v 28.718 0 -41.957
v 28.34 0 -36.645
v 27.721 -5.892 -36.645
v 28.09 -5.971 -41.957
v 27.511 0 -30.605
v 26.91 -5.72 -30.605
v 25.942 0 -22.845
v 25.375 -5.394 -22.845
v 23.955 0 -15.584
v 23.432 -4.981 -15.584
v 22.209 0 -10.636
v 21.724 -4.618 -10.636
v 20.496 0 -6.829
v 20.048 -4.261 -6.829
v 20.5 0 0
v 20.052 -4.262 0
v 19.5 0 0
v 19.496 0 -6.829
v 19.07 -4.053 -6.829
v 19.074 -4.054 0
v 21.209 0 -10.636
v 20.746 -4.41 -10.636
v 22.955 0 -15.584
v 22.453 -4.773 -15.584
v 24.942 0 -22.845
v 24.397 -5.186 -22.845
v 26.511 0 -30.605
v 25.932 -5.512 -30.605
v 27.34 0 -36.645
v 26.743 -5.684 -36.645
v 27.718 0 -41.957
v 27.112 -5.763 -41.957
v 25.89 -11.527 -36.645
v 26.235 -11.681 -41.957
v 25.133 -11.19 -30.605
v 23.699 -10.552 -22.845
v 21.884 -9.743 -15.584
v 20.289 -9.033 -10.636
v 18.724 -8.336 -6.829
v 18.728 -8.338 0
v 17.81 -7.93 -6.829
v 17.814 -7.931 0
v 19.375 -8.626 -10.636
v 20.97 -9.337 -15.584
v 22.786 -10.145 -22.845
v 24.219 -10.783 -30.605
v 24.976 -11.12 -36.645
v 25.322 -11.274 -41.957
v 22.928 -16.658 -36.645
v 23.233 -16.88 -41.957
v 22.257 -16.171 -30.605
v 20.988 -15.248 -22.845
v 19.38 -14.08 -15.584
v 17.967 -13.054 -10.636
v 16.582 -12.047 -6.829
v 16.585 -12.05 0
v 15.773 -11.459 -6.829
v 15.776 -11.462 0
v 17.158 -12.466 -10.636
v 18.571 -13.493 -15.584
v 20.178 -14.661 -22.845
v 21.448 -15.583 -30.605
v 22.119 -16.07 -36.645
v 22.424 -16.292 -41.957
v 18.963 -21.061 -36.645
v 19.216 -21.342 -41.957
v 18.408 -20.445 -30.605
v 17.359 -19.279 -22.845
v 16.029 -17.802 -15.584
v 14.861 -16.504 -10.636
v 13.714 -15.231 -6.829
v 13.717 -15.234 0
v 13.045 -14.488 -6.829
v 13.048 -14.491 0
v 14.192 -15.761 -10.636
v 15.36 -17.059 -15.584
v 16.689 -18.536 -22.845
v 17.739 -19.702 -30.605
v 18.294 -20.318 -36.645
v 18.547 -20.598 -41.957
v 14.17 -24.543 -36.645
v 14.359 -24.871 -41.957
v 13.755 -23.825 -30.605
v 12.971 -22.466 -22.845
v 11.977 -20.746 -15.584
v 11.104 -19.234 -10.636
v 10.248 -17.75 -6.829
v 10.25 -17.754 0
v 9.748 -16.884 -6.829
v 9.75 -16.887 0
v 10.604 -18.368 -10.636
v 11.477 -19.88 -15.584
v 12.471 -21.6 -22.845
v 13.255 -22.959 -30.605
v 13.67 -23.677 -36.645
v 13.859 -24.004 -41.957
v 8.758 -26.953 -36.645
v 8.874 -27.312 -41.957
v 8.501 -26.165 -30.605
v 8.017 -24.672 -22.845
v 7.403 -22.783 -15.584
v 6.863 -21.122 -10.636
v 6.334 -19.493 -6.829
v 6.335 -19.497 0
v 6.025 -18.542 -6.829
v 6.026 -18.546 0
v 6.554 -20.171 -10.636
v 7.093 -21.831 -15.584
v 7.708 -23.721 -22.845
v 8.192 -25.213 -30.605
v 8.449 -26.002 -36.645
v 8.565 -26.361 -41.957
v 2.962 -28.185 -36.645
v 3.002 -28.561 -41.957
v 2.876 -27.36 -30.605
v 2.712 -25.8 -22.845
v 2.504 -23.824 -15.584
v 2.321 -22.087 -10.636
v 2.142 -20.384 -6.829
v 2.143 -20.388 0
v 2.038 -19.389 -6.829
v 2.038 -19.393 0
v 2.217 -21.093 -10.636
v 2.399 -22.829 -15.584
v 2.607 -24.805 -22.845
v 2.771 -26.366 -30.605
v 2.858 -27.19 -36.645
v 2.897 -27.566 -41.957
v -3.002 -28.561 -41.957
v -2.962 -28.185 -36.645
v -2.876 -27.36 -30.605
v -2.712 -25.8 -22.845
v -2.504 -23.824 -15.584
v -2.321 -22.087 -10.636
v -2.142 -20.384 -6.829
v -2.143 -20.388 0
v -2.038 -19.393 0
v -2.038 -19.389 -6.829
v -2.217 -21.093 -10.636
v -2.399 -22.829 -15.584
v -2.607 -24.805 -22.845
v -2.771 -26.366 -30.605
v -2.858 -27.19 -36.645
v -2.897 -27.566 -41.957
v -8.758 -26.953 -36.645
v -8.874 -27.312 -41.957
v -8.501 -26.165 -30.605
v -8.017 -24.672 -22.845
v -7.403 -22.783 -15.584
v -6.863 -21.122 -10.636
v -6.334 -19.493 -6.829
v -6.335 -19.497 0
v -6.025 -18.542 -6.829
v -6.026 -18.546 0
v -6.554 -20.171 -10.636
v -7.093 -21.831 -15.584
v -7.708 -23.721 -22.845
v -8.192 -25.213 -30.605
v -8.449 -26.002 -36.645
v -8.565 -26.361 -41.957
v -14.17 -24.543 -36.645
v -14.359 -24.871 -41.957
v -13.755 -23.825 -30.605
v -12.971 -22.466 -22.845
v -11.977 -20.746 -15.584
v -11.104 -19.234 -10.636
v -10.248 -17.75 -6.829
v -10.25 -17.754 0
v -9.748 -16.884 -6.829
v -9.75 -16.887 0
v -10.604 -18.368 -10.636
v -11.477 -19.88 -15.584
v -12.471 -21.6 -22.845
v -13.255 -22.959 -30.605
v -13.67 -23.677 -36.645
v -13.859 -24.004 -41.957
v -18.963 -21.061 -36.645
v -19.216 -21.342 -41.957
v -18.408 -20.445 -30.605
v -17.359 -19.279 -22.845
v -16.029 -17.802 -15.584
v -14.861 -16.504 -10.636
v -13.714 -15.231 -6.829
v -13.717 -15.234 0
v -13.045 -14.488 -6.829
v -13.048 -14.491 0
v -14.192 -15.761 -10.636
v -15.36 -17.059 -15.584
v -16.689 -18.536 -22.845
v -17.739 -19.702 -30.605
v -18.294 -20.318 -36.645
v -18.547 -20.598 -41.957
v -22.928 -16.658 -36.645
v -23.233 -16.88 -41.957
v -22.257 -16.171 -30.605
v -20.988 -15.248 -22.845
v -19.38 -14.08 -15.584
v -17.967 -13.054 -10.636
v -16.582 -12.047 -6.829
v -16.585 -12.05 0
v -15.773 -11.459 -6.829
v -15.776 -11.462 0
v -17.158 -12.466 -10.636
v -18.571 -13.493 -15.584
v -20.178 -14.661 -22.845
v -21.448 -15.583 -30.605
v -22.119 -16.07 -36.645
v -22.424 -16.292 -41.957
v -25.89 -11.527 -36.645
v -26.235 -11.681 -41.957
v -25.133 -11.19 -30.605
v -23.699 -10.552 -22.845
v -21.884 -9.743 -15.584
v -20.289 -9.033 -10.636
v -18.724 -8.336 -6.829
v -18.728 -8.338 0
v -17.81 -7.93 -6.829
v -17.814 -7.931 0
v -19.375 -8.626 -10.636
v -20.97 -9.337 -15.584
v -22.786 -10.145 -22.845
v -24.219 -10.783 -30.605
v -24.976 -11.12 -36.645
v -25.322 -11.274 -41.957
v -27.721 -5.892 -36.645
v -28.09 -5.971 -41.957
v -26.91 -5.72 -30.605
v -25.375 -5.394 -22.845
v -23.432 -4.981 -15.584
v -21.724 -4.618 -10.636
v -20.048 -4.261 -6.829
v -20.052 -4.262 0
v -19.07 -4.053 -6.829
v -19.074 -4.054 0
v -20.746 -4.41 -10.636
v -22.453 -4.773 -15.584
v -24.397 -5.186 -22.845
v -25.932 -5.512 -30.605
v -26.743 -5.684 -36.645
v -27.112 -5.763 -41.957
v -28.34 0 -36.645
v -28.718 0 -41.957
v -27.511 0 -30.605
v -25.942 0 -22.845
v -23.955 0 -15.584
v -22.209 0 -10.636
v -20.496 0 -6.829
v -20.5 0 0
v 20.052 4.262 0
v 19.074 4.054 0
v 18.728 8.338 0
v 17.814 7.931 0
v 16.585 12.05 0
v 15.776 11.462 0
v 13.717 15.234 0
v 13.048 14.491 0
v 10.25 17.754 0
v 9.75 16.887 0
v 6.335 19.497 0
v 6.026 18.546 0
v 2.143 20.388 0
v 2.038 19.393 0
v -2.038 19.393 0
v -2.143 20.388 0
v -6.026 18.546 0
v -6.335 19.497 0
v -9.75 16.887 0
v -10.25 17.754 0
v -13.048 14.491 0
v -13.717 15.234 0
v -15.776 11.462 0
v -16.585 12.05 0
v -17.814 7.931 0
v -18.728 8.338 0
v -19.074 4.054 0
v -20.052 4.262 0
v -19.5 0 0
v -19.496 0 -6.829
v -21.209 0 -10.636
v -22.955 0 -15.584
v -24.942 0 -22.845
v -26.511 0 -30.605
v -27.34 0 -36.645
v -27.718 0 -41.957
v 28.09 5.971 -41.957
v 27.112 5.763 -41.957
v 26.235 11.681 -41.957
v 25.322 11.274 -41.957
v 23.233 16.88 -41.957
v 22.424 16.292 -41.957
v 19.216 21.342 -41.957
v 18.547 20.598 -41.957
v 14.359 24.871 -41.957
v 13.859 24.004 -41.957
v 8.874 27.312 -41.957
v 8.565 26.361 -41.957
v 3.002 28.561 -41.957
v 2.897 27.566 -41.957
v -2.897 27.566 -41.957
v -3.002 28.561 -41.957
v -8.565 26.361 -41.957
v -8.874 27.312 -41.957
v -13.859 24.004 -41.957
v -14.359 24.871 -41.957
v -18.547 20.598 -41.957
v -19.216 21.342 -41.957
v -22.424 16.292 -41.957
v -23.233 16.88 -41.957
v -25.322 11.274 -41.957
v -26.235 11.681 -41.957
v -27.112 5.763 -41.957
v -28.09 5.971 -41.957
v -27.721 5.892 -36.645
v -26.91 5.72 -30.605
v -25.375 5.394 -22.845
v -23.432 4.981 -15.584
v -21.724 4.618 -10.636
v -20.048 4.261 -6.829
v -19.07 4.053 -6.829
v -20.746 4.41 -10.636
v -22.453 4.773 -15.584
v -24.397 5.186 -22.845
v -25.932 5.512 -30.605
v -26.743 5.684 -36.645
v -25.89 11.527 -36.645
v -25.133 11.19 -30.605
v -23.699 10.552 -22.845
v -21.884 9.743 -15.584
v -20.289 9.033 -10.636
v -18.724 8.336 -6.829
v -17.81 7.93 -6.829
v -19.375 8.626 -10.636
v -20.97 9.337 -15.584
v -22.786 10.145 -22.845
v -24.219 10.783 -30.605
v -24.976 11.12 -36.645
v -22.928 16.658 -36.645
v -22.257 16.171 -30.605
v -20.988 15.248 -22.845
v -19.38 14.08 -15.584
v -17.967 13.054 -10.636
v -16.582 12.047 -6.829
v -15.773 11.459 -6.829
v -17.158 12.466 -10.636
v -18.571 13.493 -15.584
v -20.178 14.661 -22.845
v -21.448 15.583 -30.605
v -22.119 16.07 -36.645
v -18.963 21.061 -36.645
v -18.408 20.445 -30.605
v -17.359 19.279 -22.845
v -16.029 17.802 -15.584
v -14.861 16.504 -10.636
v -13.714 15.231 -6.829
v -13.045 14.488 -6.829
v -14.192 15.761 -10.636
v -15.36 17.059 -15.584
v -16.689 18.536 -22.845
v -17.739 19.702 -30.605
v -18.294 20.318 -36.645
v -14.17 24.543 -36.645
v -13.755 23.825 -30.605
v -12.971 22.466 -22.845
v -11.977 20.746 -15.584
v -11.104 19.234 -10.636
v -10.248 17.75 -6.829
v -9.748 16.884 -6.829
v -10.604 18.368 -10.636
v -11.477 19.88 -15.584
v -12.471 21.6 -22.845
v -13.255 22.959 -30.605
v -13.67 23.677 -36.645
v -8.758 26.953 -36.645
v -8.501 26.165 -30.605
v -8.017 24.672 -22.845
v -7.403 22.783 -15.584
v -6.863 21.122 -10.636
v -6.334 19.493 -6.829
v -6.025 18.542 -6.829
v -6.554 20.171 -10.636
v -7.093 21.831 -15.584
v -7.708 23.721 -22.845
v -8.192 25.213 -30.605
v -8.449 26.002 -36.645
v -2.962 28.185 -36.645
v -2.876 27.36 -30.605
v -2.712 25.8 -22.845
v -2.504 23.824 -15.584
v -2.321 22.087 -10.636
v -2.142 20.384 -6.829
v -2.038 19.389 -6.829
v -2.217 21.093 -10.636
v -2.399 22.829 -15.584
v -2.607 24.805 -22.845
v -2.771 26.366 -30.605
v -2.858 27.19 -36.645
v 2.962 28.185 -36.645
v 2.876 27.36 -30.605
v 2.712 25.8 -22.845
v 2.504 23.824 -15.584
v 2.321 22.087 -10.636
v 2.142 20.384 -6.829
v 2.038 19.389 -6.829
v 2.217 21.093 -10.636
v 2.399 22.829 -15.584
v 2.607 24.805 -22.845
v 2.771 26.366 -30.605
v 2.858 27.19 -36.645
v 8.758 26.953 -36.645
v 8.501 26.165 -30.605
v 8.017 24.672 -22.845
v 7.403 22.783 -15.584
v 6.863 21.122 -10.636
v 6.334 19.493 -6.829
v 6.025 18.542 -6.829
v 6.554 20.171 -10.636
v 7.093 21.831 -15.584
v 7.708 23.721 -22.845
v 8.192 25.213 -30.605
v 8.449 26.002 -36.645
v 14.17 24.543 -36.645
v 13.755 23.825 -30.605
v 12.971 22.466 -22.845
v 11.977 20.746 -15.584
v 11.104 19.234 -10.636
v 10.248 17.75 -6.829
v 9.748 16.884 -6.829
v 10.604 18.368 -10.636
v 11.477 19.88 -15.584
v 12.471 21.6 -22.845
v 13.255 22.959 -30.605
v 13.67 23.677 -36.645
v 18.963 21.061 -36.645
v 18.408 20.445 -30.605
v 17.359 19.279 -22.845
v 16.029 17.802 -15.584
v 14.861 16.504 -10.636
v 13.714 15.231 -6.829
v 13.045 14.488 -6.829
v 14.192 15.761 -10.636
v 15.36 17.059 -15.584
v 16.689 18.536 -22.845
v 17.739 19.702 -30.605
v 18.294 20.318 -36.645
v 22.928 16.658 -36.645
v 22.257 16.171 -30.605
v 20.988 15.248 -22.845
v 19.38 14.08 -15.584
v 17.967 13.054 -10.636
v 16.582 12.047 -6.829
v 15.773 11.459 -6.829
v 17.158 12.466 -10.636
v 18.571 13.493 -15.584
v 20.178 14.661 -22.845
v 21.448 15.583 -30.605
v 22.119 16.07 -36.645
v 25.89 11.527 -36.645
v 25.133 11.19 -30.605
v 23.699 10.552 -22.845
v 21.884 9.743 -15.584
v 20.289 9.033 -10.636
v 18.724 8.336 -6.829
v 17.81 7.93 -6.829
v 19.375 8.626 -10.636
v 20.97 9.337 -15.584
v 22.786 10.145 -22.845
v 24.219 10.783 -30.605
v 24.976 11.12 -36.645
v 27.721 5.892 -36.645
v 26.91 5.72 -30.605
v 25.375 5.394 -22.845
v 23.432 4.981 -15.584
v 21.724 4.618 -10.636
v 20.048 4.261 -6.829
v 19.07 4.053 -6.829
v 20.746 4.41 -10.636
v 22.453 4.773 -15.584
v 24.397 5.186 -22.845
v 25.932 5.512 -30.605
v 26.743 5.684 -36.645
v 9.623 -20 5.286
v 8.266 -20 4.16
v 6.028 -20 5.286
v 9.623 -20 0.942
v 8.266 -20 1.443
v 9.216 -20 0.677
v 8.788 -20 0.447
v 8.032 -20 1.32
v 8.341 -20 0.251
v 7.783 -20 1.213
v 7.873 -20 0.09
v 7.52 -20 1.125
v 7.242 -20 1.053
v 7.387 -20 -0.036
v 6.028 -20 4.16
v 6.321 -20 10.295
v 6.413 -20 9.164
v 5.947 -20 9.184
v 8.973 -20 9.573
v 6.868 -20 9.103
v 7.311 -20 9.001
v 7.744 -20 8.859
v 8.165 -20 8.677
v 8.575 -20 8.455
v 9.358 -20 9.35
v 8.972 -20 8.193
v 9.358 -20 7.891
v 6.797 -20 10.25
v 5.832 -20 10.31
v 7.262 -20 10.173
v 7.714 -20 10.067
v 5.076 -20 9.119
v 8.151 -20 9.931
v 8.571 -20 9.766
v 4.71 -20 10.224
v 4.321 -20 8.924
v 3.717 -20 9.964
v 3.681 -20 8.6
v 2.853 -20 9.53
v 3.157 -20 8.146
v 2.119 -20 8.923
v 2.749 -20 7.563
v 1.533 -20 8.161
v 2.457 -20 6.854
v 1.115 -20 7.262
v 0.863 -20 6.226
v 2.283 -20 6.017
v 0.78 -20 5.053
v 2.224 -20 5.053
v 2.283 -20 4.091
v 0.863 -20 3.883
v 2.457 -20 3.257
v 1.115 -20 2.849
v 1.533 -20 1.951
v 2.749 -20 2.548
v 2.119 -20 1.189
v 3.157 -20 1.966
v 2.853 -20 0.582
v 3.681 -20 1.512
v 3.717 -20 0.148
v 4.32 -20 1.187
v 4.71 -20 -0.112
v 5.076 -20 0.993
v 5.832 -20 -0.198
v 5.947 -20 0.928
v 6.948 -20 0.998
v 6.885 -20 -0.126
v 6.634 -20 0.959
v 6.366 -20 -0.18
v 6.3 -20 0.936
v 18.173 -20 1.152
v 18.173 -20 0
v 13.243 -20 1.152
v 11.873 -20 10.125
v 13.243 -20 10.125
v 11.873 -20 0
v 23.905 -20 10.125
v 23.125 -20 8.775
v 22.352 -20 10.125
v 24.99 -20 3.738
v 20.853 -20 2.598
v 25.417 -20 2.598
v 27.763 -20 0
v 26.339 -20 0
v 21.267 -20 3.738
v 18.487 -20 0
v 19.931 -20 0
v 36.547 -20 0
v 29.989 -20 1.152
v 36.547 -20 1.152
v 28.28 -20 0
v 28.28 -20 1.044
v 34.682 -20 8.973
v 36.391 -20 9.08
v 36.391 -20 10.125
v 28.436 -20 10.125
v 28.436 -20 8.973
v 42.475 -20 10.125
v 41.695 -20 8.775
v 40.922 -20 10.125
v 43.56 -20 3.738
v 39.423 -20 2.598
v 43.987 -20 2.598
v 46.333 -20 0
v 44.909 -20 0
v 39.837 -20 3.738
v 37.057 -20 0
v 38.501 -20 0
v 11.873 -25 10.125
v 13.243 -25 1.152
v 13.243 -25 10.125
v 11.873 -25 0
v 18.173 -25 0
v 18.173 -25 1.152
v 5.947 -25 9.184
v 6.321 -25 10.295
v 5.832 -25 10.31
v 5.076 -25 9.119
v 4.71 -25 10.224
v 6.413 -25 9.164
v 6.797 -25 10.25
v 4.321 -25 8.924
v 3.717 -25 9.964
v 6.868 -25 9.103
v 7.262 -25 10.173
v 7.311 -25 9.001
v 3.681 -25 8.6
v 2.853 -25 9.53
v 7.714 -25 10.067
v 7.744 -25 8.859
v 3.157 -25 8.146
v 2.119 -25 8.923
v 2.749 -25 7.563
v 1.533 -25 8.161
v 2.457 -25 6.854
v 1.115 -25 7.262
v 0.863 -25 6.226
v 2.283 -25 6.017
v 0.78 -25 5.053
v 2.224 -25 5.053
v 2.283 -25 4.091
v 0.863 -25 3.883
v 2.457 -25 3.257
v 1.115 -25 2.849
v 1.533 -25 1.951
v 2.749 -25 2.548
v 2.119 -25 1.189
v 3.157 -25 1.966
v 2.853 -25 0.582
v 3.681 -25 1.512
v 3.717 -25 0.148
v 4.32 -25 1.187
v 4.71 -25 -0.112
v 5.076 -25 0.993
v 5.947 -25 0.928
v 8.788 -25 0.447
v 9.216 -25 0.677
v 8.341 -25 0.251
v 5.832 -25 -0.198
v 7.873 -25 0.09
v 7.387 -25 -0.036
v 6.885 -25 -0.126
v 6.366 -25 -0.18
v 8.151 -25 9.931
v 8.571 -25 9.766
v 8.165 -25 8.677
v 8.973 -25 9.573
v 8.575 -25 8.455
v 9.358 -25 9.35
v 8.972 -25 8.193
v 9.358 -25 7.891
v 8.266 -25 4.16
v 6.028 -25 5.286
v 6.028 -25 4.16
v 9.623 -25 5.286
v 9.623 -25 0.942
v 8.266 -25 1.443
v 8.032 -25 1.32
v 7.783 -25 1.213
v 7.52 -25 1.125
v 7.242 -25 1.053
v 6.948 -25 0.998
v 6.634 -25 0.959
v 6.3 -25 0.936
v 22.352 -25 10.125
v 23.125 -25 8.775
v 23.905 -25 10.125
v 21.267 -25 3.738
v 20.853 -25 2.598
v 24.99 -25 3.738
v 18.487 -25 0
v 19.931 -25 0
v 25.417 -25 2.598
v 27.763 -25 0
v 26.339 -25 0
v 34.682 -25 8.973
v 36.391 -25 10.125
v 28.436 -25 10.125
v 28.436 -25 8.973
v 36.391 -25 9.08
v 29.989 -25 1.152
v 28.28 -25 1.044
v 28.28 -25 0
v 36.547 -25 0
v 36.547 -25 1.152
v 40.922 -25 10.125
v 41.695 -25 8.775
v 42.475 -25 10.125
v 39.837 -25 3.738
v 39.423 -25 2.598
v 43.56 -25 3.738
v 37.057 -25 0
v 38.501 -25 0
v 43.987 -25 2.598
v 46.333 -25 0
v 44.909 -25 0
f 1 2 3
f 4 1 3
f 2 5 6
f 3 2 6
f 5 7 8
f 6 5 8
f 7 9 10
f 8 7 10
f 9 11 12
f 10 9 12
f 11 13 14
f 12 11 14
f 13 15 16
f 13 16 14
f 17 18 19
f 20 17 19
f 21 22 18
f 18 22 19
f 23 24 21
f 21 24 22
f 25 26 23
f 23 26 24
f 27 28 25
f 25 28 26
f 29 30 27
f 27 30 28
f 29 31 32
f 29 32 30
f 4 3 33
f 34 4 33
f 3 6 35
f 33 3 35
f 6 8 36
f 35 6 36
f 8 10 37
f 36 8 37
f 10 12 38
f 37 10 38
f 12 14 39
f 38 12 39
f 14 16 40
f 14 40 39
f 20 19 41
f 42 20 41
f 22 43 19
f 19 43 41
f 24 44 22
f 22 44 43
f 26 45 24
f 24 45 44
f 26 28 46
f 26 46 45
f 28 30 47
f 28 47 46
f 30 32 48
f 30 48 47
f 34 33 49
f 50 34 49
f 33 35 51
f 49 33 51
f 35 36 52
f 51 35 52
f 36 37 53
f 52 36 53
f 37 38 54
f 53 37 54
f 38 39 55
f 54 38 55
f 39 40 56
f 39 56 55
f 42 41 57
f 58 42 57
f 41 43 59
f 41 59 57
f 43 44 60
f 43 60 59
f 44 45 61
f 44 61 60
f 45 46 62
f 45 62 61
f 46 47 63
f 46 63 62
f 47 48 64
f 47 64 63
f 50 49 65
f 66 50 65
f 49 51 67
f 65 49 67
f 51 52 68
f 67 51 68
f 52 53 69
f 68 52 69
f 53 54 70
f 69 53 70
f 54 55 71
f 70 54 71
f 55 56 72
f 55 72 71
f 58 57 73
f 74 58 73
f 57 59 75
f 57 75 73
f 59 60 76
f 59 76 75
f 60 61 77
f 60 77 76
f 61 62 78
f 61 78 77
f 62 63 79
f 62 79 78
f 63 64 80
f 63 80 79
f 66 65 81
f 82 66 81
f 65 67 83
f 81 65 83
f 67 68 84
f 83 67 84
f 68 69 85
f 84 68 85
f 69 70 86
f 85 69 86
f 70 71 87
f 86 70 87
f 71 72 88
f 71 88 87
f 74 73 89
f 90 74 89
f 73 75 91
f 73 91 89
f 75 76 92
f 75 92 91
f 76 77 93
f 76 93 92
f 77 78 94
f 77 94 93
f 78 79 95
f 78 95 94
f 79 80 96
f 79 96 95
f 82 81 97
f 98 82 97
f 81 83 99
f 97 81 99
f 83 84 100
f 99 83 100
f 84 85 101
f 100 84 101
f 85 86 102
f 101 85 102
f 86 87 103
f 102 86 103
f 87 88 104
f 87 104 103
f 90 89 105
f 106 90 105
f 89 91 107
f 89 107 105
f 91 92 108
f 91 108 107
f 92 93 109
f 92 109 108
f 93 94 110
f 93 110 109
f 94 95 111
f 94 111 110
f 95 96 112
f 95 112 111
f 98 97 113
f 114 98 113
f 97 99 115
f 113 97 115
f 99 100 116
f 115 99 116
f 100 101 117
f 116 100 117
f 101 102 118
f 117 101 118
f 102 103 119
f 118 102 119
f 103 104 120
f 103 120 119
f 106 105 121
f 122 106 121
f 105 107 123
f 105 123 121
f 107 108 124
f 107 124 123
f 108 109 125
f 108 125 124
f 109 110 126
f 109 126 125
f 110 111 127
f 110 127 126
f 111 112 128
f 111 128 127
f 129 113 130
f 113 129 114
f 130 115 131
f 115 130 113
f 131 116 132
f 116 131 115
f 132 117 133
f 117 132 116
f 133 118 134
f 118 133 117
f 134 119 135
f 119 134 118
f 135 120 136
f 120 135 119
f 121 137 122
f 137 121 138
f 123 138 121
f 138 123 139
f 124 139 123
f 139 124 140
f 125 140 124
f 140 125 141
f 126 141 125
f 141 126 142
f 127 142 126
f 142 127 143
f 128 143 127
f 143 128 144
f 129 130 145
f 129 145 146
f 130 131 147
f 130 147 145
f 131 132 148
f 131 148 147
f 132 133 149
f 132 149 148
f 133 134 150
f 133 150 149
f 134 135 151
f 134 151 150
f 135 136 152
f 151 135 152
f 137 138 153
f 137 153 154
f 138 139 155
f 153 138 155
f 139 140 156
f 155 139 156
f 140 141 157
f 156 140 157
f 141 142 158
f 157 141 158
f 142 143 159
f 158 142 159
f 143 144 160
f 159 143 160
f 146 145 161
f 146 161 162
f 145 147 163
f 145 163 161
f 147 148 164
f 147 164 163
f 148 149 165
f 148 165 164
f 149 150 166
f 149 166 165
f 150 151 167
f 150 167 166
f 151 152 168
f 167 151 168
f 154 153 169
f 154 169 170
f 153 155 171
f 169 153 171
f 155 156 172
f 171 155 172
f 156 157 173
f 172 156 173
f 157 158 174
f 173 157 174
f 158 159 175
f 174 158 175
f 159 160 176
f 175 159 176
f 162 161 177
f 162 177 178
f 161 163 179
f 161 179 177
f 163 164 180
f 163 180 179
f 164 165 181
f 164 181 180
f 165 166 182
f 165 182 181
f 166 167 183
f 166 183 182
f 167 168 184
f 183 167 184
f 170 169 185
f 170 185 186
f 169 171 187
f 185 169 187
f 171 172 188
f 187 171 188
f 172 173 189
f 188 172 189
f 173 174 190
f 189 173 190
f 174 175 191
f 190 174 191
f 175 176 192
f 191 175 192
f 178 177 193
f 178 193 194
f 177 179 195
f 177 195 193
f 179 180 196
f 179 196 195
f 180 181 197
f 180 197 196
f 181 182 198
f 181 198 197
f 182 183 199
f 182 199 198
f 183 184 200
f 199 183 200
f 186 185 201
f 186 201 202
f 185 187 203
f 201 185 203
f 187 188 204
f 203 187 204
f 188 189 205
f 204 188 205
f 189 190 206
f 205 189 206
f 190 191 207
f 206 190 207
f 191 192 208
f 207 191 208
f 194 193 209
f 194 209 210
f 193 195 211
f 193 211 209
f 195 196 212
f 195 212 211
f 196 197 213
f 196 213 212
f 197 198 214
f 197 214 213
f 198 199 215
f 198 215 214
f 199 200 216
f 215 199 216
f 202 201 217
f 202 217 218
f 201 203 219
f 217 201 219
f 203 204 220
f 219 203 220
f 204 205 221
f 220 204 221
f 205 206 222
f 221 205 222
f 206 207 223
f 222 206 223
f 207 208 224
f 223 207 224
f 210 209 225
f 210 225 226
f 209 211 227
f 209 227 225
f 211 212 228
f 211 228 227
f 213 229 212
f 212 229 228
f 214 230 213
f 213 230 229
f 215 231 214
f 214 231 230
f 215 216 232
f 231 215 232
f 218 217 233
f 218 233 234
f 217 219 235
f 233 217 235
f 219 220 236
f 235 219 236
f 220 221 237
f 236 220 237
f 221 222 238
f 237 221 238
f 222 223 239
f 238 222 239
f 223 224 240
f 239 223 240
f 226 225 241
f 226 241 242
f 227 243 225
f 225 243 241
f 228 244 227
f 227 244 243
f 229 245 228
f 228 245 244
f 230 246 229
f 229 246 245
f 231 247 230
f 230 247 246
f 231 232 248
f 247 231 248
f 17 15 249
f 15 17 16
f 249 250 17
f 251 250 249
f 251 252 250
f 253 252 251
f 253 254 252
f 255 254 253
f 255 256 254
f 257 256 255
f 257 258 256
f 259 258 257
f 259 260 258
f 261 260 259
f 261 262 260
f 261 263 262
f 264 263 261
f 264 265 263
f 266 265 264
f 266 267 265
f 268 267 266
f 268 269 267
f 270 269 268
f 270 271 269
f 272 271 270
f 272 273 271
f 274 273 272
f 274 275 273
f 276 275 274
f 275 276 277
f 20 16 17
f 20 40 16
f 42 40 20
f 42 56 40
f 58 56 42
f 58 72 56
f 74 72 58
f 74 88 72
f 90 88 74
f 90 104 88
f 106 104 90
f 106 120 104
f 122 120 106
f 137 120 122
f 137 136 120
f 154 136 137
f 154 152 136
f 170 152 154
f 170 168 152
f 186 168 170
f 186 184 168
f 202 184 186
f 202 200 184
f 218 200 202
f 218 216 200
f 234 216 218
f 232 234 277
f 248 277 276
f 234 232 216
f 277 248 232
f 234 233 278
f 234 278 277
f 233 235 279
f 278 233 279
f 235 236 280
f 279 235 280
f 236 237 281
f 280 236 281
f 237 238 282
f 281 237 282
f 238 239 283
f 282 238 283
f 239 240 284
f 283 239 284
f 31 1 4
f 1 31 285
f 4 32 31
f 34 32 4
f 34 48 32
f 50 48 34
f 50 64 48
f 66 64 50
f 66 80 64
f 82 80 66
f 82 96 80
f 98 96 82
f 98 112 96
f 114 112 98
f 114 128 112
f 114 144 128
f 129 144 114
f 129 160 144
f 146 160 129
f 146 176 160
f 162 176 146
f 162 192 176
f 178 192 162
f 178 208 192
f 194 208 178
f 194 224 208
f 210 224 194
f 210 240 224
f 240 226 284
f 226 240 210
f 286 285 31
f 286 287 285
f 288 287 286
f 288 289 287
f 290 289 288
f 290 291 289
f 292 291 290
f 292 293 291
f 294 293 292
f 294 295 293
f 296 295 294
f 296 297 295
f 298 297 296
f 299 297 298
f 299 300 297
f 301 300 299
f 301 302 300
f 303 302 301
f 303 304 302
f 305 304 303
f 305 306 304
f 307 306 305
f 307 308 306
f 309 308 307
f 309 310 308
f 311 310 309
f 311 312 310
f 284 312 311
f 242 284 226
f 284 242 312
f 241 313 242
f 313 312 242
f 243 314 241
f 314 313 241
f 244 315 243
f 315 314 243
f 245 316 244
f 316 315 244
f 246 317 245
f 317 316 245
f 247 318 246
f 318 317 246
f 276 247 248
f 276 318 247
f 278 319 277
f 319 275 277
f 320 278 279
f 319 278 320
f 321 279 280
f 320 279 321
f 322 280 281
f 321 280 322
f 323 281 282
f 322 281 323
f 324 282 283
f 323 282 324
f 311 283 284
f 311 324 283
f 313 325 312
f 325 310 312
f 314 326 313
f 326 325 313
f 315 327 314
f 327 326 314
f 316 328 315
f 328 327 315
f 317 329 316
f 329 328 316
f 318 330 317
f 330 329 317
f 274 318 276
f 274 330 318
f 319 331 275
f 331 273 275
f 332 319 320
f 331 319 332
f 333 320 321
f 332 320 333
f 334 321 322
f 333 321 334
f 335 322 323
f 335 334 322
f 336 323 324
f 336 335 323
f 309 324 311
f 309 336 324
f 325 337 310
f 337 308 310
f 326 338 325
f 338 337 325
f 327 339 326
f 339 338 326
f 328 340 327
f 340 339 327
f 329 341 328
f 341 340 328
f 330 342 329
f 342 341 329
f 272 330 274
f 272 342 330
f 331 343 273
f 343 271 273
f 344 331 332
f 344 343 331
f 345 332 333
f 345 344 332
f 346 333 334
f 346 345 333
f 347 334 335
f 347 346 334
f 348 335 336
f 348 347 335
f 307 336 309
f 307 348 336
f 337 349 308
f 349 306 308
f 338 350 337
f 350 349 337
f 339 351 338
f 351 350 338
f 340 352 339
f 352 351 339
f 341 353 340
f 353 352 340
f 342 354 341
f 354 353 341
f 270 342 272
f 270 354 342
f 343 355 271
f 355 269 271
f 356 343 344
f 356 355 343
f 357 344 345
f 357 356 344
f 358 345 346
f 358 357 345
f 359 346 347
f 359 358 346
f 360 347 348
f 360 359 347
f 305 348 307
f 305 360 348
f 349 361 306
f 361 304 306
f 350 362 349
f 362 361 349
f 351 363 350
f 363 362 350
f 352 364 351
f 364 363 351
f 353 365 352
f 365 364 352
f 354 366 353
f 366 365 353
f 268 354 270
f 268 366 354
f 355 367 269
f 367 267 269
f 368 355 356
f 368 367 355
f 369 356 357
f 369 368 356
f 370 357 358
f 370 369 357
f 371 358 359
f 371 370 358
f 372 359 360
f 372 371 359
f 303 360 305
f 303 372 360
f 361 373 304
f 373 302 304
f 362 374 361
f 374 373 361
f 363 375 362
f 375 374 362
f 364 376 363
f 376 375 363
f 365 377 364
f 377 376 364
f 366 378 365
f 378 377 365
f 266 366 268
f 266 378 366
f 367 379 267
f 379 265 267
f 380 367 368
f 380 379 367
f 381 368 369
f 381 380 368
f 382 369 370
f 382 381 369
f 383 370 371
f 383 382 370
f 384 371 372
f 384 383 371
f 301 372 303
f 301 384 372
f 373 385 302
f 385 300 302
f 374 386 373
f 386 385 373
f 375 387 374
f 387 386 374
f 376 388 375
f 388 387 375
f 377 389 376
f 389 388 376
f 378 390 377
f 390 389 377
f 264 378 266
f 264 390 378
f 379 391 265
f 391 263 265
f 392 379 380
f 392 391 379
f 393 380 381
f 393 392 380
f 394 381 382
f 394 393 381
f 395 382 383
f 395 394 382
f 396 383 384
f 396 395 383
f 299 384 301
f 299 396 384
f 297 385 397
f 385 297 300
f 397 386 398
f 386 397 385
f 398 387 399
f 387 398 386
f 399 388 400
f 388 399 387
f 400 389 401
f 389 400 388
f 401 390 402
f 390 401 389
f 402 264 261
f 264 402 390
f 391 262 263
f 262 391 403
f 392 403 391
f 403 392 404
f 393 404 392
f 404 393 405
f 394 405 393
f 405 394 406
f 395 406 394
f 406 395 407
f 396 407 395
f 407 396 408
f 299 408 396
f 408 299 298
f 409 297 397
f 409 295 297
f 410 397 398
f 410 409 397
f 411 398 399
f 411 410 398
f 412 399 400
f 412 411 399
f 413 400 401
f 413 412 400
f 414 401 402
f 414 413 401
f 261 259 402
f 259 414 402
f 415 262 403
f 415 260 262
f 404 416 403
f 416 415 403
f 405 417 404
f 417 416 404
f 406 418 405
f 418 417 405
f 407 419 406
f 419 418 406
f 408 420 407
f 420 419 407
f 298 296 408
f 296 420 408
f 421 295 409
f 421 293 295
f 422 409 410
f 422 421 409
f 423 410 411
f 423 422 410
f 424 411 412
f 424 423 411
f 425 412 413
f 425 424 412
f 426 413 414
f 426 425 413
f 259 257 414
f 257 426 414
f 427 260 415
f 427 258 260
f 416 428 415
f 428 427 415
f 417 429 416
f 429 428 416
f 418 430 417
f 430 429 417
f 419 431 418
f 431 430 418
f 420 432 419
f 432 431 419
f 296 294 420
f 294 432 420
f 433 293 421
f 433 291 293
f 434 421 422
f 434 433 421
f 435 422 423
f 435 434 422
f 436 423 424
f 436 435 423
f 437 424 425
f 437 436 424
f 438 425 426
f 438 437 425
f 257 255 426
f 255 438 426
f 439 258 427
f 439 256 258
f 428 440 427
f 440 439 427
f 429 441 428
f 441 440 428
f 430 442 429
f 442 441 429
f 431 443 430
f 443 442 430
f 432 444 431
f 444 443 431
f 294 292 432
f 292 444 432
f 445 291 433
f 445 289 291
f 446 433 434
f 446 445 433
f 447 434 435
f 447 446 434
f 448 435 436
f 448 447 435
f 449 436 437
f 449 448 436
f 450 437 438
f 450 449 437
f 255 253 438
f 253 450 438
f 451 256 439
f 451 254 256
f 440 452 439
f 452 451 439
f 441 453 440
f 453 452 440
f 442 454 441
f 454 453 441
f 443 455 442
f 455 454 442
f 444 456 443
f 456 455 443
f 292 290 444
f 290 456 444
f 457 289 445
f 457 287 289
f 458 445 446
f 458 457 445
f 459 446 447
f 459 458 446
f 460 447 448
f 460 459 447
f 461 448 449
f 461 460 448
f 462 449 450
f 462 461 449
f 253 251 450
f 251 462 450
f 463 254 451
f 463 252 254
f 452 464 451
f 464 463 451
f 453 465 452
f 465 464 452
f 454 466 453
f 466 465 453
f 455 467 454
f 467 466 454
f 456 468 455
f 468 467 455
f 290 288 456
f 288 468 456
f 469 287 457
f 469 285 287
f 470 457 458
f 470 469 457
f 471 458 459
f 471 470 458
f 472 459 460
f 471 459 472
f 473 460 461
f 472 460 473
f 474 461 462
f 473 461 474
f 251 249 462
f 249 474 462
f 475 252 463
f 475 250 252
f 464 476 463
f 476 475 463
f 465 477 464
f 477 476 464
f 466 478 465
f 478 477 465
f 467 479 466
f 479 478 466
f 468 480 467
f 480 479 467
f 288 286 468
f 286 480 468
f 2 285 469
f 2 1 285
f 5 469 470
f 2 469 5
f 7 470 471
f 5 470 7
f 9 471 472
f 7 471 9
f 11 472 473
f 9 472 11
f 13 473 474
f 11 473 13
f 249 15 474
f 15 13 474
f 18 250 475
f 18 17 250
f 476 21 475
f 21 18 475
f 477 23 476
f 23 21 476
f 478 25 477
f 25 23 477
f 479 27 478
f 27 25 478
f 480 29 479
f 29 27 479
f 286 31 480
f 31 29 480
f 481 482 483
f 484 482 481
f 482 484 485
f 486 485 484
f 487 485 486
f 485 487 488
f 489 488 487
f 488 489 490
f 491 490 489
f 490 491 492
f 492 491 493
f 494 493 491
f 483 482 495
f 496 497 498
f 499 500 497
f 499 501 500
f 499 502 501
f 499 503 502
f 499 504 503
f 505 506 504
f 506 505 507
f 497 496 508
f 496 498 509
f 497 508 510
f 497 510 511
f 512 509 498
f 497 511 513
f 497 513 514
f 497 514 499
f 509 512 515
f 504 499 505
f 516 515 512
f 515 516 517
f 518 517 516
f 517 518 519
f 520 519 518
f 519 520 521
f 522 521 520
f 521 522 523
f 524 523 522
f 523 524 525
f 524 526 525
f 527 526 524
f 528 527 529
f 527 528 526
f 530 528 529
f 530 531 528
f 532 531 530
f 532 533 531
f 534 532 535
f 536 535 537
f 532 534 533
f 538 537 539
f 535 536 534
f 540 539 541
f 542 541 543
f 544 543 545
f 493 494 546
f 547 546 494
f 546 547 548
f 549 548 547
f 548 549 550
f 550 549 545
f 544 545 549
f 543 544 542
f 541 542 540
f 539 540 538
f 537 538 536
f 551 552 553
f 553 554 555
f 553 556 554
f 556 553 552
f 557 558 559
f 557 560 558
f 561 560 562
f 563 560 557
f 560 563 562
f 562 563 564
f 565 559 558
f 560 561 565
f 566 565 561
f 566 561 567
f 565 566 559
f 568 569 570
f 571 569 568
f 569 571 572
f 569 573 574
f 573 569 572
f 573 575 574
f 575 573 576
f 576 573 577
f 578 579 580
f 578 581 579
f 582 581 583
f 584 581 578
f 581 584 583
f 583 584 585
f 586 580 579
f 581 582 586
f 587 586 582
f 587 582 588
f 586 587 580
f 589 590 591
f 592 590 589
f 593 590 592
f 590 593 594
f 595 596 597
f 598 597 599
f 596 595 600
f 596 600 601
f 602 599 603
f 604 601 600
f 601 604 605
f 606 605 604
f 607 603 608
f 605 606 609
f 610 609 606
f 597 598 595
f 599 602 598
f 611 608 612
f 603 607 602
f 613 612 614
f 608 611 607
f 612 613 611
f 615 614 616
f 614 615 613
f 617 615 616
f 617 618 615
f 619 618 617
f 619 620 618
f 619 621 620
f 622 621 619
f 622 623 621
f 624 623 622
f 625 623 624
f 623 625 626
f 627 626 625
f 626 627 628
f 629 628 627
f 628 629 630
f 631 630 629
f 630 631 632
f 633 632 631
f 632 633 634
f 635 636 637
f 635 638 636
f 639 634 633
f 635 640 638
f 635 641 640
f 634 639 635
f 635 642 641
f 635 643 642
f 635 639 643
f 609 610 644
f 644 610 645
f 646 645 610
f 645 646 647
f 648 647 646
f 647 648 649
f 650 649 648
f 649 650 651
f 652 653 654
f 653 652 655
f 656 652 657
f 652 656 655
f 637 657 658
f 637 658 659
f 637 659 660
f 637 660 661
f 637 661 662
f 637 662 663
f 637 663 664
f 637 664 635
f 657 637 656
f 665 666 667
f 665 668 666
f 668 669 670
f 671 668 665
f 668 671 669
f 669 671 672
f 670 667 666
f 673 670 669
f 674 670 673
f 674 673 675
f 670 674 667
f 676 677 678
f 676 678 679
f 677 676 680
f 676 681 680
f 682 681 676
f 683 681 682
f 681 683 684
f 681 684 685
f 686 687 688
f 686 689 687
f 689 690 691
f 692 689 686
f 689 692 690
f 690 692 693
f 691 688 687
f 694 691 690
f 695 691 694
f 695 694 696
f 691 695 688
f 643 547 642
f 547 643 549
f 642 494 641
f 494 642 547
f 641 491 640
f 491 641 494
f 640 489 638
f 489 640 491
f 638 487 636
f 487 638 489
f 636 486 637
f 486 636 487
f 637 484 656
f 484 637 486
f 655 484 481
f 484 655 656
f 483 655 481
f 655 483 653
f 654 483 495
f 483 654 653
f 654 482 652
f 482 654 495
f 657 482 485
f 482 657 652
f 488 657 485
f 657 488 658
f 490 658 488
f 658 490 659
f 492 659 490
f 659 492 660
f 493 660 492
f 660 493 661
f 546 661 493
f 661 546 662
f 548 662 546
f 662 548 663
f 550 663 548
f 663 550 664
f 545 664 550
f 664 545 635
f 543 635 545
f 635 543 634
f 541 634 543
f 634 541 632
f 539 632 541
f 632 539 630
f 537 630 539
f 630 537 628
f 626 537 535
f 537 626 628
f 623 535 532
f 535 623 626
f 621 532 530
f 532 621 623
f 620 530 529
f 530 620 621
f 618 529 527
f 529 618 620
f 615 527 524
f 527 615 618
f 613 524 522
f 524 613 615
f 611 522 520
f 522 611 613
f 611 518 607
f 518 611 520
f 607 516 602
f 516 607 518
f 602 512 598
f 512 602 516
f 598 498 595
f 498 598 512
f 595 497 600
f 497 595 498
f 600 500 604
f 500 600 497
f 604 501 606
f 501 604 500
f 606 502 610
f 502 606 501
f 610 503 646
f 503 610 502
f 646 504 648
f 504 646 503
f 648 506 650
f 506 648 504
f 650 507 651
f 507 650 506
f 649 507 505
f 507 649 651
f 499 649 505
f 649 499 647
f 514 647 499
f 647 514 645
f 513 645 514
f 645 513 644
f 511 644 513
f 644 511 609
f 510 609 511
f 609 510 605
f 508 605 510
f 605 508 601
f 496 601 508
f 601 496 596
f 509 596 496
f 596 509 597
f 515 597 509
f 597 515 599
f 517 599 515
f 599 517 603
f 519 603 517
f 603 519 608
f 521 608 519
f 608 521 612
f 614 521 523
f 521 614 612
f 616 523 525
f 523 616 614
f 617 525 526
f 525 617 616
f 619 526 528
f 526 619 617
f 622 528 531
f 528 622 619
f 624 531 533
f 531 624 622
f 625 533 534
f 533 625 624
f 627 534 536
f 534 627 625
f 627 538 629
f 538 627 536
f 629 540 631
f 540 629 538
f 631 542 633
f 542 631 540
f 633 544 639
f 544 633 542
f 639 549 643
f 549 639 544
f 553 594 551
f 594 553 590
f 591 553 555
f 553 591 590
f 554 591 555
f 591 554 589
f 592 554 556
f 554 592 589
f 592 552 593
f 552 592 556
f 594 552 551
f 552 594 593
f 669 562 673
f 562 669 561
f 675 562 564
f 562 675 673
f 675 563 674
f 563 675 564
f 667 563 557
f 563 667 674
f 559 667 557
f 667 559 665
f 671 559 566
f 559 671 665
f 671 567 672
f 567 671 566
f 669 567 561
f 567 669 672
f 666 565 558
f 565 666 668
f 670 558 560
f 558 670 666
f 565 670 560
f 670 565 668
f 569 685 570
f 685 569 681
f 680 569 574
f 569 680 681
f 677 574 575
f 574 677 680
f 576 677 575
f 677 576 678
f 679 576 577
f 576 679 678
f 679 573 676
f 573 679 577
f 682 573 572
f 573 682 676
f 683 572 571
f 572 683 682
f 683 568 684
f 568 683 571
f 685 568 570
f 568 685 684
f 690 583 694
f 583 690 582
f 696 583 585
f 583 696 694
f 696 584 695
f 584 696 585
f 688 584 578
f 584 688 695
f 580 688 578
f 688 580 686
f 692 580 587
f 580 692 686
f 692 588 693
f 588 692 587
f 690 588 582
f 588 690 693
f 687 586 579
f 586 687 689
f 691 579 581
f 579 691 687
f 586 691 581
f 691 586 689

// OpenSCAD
// file: ../../gospel.scad
/**
 * GOSPEL: George's OpenSCAD Procedural Enhancement Library
 * @author glaza
 *
 * Index:
 *      Translation: x, y, z, xy, xz, yz, xyz (displacement, variation)
 *      Scaling:     sx, sy, sz, sxy, sxz, syz, s (factor, variation)
 *      Rotation:    rx, ry, rz (angle, variation)
 *      Duplication: dx, dy, dz ()
 */

/**
 * Translates the children in the X,Y,Z direction
 * @param d Displacement in X,Y,Z direction
 * @param variation The random variation + or - added to the displacement * 
 *  x      Translate X
 *  y      Translate Y
 *  z      Translate Z
 *  xy     Translate equaly in X and Y
 *  xz     Translate equaly in X and Z
 *  yz     Translate equaly in Y and Z
 *  xyz    Translate equaly in X, Y and Z
 */
module x(dx, variation=0) 
{   
    vx = rands(-variation,variation,1)[0];
    translate([dx+vx,0,0])
    children();
}
module y(dy, variation=0) 
{   
    vy = rands(-variation,variation,1)[0];
    translate([0,dy+vy,0])
    children();
} 
module z(dz, variation=0) 
{   
    vz = rands(-variation,variation,1)[0];
    translate([0,0,dz+vz])
    children();
}
module xy(d, variation=0) 
{   
    x(d, variation)
    y(d, variation)
    children();
}
module yz(d, variation=0) 
{   
    z(d, variation)
    y(d, variation)
    children();
}
module xz(d, variation=0) 
{   
    x(d, variation)
    z(d, variation)
    children();
}
module xyz(d, variation=0) 
{   
    xy(d, variation)
    z(d, variation)
    children();
}

/**
 * Rotates the children around the X axis
 * @param angle Degrees to rotate around the X axis
 * @param variation The random variation + or - added
 *  rx     Rotate around X
 *  ry     Rotate around Y
 *  rz     Rotate around Z
 */
module rx(angle, variation=0) 
{   
    v = rands(-variation,variation,1)[0];
    rotate([angle+v,0,0])
    children();
}
module ry(angle, variation=0) 
{   
    v = rands(-variation,variation,1)[0];
    rotate([0,angle+v,0,0])
    children();
}
module rz(angle, variation=0) 
{   
    v = rands(-variation,variation,1)[0];
    rotate([0,0,angle+v])
    children();
}

/**
 * Duplicates the children across the different planes.
 *      dx: YZ plane, dy: XZ plane, dz: XY plane
 */
module dx() 
{
    mirror([1,0,0])
    children();

    children();
}
module dy() 
{
    mirror([0,1,0])
    children();

    children();
}
module dz() 
{
    mirror([0,0,1])
    children();

    children();
}

/**
 * Mirrors across diferent planes.
 *      mx: YZ plane, my: XZ plane, mz: XY plane
 */
module mx() 
{
    mirror([1,0,0])
    children();
}
module my() 
{
    mirror([0,1,0])
    children();
}
module mz() 
{
    mirror([0,0,1])
    children();
}

/**
 * Scales in different directions
 *      mx: YZ plane, my: XZ plane, mz: XY plane
 */
module sx(factor, variation=0) 
{   
    v = rands(-variation,variation,1)[0];
    scale([factor+v,1,1])
    children();
}
module sy(factor, variation=0) 
{   
    v = rands(-variation,variation,1)[0];
    scale([1,factor+v,1])
    children();
} 
module sz(factor, variation=0) 
{   
    v = rands(-variation,variation,1)[0];
    scale([1,1,factor+v])
    children();
}
module sxy(factor, variation=0) 
{   
    sx(factor, variation)
    sy(factor, variation)
    children();
}
module syz(factor, variation=0) 
{   
    sz(factor, variation)
    sy(factor, variation)
    children();
}
module sxz(d, variation=0) 
{   
    sx(factor, variation)
    sz(factor, variation)
    children();
}
module s(factor, variation=0) 
{   
    sxy(factor, variation)
    sz(factor, variation)
    children();
}

/**
 * Colours
 */
module red()
{
    color("Red")
    children();
}
module blue()
{
    color("RoyalBlue")
    children();
}
module black()
{
    color("Black")
    children();
}
module white()
{
    color("White")
    children();
}
// main file
include <../../gospel.scad>


draw_cover();
#draw_letters( "GLAZA" );

module draw_cover()
{
    rotate_extrude(angle = 360, convexity = 2)
    {   
        x(-39/2)    
        x(86.066)
        y(-134.32)
        polygon(
            points=
                [[-95.284, 92.363],
                 [-94.906, 97.675],
                 [-94.077, 103.715],
                 [-92.508, 111.475],
                 [-90.521, 118.736],
                 [-88.775, 123.684],
                 [-87.062, 127.491],
                 [-87.066, 134.32],
                 // inside
                 [-86.066, 134.32],
                 [-86.062, 127.491],
                 [-87.775, 123.684],
                 [-89.521, 118.736],
                 [-91.508, 111.475],
                 [-93.077, 103.715],
                 [-93.906, 97.675],
                 [-94.284, 92.363],
            ],
            paths=
                [[0, 1, 2, 3, 4, 5, 6, 7, 8, 9, 10, 11, 12, 13, 14, 15]]
        );
    }
}

module draw_letters( string )
{
    for ( letter = [string] )
    {
        y(-20)
        rx(90)
        linear_extrude(5)
        text(letter, font="Stencilia\\-Bold");
    }
}
